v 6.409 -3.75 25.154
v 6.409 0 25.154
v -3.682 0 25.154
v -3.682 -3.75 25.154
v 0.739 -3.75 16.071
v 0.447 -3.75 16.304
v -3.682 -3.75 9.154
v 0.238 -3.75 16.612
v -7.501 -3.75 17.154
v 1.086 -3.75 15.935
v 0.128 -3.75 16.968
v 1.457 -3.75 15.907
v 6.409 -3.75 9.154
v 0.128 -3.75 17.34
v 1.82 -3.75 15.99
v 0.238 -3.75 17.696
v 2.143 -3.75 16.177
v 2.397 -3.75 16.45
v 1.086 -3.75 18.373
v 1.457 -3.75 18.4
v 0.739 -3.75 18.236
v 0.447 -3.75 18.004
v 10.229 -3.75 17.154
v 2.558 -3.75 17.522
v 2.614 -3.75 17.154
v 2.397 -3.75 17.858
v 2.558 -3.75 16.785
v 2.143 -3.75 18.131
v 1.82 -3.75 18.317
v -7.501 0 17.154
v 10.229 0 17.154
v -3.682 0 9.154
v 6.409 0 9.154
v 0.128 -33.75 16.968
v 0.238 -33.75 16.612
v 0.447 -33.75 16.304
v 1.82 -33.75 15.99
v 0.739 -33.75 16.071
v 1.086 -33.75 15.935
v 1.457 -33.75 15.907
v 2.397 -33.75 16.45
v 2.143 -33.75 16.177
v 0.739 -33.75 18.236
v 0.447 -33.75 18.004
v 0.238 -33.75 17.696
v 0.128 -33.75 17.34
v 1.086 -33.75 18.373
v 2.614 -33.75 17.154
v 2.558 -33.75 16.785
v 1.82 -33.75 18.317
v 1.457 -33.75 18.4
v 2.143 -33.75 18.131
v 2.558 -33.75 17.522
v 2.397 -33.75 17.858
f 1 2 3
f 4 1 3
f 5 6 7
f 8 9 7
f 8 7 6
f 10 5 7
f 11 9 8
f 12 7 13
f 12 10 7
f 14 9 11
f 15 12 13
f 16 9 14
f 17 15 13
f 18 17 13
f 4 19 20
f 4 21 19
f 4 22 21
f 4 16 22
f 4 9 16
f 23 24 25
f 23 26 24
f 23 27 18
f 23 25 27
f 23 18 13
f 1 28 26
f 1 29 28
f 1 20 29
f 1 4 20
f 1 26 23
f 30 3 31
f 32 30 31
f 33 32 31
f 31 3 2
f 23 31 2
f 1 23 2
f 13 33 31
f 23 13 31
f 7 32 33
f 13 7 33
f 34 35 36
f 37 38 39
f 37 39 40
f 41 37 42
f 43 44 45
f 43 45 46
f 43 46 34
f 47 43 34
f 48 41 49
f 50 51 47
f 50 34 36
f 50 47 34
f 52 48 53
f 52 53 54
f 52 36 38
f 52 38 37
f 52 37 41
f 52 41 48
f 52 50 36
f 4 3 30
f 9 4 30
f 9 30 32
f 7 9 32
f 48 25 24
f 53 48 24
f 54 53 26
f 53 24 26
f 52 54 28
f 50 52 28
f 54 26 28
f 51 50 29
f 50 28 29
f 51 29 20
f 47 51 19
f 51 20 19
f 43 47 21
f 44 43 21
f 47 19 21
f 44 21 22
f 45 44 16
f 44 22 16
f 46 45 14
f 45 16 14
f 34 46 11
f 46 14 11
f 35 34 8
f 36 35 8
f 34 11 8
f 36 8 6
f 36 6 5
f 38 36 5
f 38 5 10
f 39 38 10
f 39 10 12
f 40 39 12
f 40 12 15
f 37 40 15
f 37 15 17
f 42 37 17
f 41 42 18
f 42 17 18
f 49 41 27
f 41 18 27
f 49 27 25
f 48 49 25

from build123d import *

# Parameters (mm, degrees)
F1_DEPTH = 3.75
F2_R     = 1.25
F3_DEPTH = 30


with BuildPart() as f1:
    # F0 (on Front) → F1 (new body)
    with BuildSketch(Plane.XZ):
        Polygon((6.409004, 25.153901), (-3.681577, 25.153901), (-7.50148, 17.153901), (-3.681577, 9.153901), (6.409004, 9.153901), (10.228907, 17.153901), align=None)
    extrude(amount=F1_DEPTH)

    # F2 (on face) → F3 (join)
    with BuildSketch(Plane.XZ.offset(3.75)):
        with Locations((1.363714, 17.153901)):
            Circle(F2_R)
    extrude(amount=F3_DEPTH)


solid = f1.part
